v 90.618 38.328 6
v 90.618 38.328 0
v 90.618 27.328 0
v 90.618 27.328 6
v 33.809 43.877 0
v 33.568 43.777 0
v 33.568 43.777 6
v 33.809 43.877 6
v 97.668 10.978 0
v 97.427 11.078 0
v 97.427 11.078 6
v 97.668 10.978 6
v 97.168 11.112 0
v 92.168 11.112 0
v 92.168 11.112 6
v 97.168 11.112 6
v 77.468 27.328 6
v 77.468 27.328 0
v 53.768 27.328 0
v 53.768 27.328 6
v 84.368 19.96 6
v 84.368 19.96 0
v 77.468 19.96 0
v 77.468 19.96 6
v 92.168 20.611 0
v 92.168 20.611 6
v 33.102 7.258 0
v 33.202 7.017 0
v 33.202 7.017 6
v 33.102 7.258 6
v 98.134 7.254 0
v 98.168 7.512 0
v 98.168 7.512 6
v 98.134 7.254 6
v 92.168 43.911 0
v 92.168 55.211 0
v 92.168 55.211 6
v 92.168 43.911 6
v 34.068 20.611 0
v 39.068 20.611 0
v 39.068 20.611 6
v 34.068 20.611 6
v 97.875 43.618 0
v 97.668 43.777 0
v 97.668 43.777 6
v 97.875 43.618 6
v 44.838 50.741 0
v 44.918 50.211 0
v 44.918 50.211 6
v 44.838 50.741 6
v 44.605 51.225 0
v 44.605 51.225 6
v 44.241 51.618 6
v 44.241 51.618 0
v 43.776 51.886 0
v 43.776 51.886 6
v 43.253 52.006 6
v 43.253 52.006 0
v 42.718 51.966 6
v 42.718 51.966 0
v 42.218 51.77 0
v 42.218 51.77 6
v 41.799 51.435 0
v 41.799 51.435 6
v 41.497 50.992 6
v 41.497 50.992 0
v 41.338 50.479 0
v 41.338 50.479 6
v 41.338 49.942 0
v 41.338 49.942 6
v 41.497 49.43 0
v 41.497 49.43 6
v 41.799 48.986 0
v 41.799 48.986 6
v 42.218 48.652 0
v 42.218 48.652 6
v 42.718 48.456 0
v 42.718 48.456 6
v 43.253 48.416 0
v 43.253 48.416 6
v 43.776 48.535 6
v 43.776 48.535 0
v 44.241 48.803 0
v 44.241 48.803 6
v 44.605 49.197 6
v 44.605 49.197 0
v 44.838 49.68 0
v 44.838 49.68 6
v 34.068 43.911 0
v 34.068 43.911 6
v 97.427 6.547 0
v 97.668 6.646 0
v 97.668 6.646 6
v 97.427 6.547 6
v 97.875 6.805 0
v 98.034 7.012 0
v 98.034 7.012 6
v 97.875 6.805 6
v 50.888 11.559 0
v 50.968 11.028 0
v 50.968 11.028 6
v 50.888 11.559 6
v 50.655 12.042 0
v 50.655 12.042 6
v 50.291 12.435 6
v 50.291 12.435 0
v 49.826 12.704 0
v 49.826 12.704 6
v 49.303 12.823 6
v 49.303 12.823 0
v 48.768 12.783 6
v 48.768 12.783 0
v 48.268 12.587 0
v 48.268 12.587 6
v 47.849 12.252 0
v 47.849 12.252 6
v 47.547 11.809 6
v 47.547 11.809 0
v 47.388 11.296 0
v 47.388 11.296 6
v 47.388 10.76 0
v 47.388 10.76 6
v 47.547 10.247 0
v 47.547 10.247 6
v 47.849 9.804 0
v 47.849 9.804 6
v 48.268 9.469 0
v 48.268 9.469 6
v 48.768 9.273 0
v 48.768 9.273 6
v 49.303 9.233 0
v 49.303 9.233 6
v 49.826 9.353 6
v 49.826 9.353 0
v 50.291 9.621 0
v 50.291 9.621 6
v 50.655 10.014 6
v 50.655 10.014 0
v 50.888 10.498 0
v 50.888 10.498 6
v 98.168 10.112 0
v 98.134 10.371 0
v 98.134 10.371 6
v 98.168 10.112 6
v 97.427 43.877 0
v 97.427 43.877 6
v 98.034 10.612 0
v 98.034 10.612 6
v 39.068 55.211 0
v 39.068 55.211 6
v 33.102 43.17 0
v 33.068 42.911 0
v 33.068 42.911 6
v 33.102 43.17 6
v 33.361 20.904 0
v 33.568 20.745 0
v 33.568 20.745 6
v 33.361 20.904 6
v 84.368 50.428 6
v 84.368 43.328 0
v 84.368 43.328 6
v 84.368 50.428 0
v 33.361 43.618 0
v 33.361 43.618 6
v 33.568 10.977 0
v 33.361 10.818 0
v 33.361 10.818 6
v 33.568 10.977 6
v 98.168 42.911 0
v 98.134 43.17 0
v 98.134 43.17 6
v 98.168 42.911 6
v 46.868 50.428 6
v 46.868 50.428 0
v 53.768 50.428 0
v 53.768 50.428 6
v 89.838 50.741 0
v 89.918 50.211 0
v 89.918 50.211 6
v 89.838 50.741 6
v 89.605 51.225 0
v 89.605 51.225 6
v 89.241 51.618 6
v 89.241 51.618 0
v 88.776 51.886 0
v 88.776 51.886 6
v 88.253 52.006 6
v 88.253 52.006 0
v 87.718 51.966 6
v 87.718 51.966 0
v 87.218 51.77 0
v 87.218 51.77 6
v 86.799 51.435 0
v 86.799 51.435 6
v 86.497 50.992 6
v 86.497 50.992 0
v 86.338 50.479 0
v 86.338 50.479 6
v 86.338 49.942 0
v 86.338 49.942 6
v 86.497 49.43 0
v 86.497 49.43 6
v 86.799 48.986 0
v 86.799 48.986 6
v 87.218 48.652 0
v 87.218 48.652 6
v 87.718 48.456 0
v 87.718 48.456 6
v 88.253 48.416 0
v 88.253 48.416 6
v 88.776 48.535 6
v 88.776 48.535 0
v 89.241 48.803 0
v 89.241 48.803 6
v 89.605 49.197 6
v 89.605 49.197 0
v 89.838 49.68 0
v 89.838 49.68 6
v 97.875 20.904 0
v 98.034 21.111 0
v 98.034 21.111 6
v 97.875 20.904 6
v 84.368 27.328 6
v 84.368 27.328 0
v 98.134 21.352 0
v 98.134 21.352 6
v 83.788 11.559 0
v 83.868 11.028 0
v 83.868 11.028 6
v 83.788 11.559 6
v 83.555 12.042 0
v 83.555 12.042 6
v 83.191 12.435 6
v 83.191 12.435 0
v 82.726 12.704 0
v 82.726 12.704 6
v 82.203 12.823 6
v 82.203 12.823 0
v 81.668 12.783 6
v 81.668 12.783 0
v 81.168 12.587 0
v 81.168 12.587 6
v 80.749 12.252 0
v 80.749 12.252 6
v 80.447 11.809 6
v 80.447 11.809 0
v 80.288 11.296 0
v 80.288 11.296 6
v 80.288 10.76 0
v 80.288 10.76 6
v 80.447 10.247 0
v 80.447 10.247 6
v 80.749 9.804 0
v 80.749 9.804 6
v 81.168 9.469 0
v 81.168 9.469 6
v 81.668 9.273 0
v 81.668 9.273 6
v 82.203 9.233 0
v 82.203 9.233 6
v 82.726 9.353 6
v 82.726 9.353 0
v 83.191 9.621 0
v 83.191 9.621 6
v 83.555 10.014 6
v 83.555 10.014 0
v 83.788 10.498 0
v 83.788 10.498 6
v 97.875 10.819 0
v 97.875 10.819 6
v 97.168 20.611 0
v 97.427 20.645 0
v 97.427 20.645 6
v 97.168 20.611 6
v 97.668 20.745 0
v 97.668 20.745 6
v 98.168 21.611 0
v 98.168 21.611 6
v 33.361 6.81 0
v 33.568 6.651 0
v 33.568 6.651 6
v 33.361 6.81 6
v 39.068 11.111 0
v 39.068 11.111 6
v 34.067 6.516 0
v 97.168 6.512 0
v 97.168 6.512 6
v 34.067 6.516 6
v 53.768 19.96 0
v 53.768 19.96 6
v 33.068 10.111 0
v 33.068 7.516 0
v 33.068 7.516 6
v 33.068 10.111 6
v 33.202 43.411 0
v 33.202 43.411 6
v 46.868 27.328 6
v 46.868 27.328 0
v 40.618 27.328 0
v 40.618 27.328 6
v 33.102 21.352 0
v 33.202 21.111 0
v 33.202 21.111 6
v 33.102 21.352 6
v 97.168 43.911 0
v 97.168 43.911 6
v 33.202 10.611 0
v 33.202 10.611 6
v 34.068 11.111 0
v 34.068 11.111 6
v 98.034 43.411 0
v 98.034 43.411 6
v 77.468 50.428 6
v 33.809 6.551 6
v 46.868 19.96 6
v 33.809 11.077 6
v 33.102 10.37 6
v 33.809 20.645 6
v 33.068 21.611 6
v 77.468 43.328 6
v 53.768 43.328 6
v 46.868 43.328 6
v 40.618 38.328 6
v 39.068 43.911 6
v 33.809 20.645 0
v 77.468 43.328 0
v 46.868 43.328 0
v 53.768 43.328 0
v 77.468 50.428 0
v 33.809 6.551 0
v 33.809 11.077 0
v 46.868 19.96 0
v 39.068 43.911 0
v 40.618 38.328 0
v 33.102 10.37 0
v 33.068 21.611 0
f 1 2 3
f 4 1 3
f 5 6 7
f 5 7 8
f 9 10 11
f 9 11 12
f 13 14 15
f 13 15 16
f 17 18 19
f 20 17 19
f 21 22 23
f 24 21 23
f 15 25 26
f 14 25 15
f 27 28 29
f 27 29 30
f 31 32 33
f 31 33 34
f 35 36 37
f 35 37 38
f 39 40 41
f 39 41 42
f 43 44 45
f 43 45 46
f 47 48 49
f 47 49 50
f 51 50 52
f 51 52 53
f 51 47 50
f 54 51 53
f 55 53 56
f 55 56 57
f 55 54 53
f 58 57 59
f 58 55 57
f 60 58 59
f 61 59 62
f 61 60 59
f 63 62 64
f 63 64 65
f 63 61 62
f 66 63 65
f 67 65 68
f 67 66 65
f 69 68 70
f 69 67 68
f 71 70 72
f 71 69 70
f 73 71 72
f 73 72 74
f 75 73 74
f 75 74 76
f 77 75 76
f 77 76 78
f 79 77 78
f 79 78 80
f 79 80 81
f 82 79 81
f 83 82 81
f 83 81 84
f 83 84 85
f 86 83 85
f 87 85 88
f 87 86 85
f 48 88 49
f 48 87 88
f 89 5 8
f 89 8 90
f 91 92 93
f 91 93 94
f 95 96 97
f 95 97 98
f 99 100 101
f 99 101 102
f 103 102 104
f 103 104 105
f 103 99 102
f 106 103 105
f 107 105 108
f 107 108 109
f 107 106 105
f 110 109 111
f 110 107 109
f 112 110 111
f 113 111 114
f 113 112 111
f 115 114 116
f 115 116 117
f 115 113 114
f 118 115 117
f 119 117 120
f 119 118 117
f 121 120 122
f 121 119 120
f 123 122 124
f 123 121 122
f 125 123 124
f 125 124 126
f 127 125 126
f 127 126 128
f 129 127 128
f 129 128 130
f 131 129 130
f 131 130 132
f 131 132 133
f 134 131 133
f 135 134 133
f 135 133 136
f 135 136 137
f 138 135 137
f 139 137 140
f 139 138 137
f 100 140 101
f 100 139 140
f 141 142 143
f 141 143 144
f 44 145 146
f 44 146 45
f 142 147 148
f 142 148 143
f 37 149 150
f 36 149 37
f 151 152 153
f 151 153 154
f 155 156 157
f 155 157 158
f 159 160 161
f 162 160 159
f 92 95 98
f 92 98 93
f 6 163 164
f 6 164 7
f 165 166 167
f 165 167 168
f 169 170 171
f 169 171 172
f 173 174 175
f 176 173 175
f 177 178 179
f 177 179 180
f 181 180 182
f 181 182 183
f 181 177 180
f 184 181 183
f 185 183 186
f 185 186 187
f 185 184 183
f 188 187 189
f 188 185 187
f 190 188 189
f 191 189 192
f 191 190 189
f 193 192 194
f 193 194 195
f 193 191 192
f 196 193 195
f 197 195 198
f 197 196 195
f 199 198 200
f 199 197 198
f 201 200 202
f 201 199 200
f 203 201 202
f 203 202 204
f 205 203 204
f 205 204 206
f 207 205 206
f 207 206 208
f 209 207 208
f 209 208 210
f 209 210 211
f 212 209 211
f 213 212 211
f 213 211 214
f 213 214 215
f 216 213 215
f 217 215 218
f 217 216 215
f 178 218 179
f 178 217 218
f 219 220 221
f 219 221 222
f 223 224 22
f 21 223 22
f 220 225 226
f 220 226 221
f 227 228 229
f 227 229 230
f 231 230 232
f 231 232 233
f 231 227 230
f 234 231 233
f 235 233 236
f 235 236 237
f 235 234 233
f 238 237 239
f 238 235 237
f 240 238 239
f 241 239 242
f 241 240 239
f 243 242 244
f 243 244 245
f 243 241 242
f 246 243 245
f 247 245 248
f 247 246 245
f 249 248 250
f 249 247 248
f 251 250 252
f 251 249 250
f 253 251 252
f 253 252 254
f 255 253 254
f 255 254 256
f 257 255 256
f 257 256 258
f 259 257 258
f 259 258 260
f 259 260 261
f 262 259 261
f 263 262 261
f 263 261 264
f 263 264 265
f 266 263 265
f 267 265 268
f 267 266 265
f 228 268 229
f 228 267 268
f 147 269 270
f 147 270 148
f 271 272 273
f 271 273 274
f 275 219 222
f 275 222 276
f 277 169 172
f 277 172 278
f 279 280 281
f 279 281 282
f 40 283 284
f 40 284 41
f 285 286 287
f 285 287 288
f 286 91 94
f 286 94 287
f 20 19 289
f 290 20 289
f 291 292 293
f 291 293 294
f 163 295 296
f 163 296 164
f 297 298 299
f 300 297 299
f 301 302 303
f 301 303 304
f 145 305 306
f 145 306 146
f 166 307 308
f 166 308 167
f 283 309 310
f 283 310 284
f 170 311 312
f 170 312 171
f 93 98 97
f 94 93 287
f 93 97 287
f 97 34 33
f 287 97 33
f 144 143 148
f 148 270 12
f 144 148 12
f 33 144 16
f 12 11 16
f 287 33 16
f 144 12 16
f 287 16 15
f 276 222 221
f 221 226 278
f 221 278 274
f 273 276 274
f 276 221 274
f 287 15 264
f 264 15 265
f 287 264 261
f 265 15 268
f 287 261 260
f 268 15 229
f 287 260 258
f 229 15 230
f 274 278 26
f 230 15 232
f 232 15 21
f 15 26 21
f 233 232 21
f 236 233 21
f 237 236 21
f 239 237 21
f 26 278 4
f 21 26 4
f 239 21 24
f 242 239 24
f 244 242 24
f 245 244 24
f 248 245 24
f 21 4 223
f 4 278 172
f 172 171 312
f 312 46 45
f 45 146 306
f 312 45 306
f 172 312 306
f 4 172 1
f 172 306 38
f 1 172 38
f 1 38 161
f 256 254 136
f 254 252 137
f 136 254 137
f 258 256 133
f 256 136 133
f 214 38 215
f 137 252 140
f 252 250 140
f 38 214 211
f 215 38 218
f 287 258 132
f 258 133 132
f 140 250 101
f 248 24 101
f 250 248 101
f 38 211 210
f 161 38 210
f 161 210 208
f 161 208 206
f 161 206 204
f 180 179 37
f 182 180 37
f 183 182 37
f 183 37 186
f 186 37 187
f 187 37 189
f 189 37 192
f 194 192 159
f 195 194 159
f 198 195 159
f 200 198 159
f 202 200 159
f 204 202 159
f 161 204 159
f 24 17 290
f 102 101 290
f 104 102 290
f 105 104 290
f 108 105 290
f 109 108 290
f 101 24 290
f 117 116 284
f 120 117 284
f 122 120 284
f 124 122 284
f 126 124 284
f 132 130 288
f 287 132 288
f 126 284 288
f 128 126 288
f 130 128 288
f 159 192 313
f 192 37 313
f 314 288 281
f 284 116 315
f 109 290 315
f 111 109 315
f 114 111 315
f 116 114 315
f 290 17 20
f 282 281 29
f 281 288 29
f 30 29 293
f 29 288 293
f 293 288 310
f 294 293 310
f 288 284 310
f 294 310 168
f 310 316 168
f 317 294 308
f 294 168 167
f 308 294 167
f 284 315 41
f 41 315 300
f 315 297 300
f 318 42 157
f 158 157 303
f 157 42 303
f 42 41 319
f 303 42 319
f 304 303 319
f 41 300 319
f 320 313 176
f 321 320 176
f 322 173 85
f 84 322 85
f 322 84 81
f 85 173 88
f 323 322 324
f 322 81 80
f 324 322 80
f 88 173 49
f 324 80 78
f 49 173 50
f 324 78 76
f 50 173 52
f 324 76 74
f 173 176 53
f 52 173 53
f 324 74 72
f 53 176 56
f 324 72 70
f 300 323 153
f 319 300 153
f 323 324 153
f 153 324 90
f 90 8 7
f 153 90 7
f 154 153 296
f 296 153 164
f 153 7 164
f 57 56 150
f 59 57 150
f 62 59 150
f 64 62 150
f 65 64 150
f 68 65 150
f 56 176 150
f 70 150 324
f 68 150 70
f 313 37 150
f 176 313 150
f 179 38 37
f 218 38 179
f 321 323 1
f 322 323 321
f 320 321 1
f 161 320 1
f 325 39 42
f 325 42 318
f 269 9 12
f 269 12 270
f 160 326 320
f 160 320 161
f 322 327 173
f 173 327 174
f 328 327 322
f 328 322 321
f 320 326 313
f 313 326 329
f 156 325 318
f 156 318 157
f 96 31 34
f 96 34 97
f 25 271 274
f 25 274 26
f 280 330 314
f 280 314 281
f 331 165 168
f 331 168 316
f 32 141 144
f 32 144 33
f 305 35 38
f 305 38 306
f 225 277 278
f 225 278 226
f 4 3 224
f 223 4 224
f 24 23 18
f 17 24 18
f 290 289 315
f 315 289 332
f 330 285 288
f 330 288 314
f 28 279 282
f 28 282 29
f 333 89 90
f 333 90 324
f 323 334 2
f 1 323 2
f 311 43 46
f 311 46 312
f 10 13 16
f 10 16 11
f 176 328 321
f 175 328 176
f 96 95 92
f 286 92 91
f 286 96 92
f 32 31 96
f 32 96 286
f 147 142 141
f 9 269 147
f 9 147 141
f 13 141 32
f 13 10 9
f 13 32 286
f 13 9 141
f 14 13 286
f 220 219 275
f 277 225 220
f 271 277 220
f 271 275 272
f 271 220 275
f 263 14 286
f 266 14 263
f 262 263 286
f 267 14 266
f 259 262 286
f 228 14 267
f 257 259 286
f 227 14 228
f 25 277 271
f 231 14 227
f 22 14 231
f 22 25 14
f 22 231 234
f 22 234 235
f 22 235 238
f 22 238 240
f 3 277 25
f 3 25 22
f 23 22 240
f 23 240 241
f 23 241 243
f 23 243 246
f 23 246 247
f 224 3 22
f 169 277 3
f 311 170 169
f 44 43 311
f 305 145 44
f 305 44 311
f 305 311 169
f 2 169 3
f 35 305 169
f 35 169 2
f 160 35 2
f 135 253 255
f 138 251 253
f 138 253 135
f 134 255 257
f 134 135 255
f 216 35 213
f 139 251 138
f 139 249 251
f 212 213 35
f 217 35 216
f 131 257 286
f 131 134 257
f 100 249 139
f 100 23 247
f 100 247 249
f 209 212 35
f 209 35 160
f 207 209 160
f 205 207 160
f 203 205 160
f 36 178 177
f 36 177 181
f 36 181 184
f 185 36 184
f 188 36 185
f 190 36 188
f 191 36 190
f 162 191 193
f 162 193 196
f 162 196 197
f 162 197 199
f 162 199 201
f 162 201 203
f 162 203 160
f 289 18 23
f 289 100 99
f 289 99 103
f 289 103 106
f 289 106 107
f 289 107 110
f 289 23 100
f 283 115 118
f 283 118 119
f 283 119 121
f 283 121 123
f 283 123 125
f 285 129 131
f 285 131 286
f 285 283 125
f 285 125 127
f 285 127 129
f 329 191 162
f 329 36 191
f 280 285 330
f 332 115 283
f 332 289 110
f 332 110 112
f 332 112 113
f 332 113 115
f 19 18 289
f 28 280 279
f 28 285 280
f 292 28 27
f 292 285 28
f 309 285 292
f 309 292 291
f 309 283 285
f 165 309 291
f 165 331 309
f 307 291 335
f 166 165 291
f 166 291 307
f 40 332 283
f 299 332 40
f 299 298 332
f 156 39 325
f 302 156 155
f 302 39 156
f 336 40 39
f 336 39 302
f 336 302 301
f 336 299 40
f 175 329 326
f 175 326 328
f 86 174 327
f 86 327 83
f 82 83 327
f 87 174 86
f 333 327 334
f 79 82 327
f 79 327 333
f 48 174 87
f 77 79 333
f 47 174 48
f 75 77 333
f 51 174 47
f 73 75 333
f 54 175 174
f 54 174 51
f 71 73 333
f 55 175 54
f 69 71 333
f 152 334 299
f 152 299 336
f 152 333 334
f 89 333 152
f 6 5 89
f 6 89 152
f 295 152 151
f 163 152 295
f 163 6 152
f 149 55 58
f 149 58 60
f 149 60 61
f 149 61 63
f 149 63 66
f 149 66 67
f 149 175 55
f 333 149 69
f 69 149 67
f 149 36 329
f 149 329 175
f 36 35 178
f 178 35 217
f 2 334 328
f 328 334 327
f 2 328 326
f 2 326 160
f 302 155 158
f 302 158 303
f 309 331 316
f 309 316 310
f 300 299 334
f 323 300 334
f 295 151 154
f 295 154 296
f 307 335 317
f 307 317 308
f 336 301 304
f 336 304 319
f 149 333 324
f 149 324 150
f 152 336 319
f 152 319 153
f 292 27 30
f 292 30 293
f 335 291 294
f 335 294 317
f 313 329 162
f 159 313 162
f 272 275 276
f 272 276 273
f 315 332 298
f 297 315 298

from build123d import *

# Parameters (mm, degrees)
MODEL_R                  = 1.8
MODEL_W                  = 6.9
MODEL_H                  = 7.1
RESSALTO_EXTRUS_O1_DEPTH = 6


with BuildPart() as part:
    # Model → Ressalto-extrusão1 (new body)
    with BuildSketch(Plane.XY):
        Polygon((98.034292433, 10.612136161), (98.134192856, 10.370955206), (98.16826703, 10.112136161), (98.16826703, 7.512443376), (98.134192856, 7.25362433), (98.034292433, 7.012443376), (97.875373811, 6.805336594), (97.66826703, 6.646417972), (97.427086075, 6.546517549), (97.16826703, 6.512443376), (34.067480382, 6.516377235), (33.808814837, 6.550620973), (33.567812927, 6.650613857), (33.360882181, 6.809548321), (33.202110548, 7.016604029), (33.102307278, 7.257684523), (33.06826703, 7.516376926), (33.06826703, 10.110713257), (33.102341203, 10.369532302), (33.202241626, 10.610713257), (33.361160249, 10.817820038), (33.56826703, 10.97673866), (33.809447985, 11.076639083), (34.06826703, 11.110713257), (39.06826703, 11.110713257), (39.06826703, 20.610713257), (34.06826703, 20.610713257), (33.809447985, 20.64478743), (33.56826703, 20.744687853), (33.361160249, 20.903606475), (33.202241626, 21.110713257), (33.102341203, 21.351894212), (33.06826703, 21.610713257), (33.06826703, 42.910713257), (33.102341203, 43.169532302), (33.202241626, 43.410713257), (33.361160249, 43.617820038), (33.56826703, 43.77673866), (33.809447985, 43.876639083), (34.06826703, 43.910713257), (39.06826703, 43.910713257), (39.06826703, 55.210713257), (92.16826703, 55.210713257), (92.16826703, 43.910713257), (97.16826703, 43.910713257), (97.427086075, 43.876639083), (97.66826703, 43.77673866), (97.875373811, 43.617820038), (98.034292433, 43.410713257), (98.134192856, 43.169532302), (98.16826703, 42.910713257), (98.16826703, 21.610713257), (98.134192856, 21.351894212), (98.034292433, 21.110713257), (97.875373811, 20.903606475), (97.66826703, 20.744687853), (97.427086075, 20.64478743), (97.16826703, 20.610713257), (92.16826703, 20.610713257), (92.16826703, 11.112136161), (97.16826703, 11.112136161), (97.427086075, 11.078061987), (97.66826703, 10.978161564), (97.875373811, 10.819242942), align=None)
        with Locations((49.16826703, 11.028176846)):
            Circle(MODEL_R, mode=Mode.SUBTRACT)
        with Locations((82.06826703, 11.028176846)):
            Circle(MODEL_R, mode=Mode.SUBTRACT)
        with Locations((88.11826703, 50.210713257)):
            Circle(MODEL_R, mode=Mode.SUBTRACT)
        with Locations((43.11826703, 50.210713257)):
            Circle(MODEL_R, mode=Mode.SUBTRACT)
        with Locations((80.91826703, 46.878174347)):
            Rectangle(MODEL_W, MODEL_H, mode=Mode.SUBTRACT)
        Polygon((53.76826703, 27.328179344), (53.76826703, 19.959715186), (46.86826703, 19.959715186), (46.86826703, 27.328179344), (40.618277181, 27.328179344), (40.618277181, 38.328174347), (90.618256879, 38.328174347), (90.618256879, 27.328179344), (84.36826703, 27.328179344), (84.36826703, 19.959715186), (77.46826703, 19.959715186), (77.46826703, 27.328179344), align=None, mode=Mode.SUBTRACT)
        with Locations((50.31826703, 46.878174347)):
            Rectangle(MODEL_W, MODEL_H, mode=Mode.SUBTRACT)
    extrude(amount=RESSALTO_EXTRUS_O1_DEPTH)


solid = part.part
